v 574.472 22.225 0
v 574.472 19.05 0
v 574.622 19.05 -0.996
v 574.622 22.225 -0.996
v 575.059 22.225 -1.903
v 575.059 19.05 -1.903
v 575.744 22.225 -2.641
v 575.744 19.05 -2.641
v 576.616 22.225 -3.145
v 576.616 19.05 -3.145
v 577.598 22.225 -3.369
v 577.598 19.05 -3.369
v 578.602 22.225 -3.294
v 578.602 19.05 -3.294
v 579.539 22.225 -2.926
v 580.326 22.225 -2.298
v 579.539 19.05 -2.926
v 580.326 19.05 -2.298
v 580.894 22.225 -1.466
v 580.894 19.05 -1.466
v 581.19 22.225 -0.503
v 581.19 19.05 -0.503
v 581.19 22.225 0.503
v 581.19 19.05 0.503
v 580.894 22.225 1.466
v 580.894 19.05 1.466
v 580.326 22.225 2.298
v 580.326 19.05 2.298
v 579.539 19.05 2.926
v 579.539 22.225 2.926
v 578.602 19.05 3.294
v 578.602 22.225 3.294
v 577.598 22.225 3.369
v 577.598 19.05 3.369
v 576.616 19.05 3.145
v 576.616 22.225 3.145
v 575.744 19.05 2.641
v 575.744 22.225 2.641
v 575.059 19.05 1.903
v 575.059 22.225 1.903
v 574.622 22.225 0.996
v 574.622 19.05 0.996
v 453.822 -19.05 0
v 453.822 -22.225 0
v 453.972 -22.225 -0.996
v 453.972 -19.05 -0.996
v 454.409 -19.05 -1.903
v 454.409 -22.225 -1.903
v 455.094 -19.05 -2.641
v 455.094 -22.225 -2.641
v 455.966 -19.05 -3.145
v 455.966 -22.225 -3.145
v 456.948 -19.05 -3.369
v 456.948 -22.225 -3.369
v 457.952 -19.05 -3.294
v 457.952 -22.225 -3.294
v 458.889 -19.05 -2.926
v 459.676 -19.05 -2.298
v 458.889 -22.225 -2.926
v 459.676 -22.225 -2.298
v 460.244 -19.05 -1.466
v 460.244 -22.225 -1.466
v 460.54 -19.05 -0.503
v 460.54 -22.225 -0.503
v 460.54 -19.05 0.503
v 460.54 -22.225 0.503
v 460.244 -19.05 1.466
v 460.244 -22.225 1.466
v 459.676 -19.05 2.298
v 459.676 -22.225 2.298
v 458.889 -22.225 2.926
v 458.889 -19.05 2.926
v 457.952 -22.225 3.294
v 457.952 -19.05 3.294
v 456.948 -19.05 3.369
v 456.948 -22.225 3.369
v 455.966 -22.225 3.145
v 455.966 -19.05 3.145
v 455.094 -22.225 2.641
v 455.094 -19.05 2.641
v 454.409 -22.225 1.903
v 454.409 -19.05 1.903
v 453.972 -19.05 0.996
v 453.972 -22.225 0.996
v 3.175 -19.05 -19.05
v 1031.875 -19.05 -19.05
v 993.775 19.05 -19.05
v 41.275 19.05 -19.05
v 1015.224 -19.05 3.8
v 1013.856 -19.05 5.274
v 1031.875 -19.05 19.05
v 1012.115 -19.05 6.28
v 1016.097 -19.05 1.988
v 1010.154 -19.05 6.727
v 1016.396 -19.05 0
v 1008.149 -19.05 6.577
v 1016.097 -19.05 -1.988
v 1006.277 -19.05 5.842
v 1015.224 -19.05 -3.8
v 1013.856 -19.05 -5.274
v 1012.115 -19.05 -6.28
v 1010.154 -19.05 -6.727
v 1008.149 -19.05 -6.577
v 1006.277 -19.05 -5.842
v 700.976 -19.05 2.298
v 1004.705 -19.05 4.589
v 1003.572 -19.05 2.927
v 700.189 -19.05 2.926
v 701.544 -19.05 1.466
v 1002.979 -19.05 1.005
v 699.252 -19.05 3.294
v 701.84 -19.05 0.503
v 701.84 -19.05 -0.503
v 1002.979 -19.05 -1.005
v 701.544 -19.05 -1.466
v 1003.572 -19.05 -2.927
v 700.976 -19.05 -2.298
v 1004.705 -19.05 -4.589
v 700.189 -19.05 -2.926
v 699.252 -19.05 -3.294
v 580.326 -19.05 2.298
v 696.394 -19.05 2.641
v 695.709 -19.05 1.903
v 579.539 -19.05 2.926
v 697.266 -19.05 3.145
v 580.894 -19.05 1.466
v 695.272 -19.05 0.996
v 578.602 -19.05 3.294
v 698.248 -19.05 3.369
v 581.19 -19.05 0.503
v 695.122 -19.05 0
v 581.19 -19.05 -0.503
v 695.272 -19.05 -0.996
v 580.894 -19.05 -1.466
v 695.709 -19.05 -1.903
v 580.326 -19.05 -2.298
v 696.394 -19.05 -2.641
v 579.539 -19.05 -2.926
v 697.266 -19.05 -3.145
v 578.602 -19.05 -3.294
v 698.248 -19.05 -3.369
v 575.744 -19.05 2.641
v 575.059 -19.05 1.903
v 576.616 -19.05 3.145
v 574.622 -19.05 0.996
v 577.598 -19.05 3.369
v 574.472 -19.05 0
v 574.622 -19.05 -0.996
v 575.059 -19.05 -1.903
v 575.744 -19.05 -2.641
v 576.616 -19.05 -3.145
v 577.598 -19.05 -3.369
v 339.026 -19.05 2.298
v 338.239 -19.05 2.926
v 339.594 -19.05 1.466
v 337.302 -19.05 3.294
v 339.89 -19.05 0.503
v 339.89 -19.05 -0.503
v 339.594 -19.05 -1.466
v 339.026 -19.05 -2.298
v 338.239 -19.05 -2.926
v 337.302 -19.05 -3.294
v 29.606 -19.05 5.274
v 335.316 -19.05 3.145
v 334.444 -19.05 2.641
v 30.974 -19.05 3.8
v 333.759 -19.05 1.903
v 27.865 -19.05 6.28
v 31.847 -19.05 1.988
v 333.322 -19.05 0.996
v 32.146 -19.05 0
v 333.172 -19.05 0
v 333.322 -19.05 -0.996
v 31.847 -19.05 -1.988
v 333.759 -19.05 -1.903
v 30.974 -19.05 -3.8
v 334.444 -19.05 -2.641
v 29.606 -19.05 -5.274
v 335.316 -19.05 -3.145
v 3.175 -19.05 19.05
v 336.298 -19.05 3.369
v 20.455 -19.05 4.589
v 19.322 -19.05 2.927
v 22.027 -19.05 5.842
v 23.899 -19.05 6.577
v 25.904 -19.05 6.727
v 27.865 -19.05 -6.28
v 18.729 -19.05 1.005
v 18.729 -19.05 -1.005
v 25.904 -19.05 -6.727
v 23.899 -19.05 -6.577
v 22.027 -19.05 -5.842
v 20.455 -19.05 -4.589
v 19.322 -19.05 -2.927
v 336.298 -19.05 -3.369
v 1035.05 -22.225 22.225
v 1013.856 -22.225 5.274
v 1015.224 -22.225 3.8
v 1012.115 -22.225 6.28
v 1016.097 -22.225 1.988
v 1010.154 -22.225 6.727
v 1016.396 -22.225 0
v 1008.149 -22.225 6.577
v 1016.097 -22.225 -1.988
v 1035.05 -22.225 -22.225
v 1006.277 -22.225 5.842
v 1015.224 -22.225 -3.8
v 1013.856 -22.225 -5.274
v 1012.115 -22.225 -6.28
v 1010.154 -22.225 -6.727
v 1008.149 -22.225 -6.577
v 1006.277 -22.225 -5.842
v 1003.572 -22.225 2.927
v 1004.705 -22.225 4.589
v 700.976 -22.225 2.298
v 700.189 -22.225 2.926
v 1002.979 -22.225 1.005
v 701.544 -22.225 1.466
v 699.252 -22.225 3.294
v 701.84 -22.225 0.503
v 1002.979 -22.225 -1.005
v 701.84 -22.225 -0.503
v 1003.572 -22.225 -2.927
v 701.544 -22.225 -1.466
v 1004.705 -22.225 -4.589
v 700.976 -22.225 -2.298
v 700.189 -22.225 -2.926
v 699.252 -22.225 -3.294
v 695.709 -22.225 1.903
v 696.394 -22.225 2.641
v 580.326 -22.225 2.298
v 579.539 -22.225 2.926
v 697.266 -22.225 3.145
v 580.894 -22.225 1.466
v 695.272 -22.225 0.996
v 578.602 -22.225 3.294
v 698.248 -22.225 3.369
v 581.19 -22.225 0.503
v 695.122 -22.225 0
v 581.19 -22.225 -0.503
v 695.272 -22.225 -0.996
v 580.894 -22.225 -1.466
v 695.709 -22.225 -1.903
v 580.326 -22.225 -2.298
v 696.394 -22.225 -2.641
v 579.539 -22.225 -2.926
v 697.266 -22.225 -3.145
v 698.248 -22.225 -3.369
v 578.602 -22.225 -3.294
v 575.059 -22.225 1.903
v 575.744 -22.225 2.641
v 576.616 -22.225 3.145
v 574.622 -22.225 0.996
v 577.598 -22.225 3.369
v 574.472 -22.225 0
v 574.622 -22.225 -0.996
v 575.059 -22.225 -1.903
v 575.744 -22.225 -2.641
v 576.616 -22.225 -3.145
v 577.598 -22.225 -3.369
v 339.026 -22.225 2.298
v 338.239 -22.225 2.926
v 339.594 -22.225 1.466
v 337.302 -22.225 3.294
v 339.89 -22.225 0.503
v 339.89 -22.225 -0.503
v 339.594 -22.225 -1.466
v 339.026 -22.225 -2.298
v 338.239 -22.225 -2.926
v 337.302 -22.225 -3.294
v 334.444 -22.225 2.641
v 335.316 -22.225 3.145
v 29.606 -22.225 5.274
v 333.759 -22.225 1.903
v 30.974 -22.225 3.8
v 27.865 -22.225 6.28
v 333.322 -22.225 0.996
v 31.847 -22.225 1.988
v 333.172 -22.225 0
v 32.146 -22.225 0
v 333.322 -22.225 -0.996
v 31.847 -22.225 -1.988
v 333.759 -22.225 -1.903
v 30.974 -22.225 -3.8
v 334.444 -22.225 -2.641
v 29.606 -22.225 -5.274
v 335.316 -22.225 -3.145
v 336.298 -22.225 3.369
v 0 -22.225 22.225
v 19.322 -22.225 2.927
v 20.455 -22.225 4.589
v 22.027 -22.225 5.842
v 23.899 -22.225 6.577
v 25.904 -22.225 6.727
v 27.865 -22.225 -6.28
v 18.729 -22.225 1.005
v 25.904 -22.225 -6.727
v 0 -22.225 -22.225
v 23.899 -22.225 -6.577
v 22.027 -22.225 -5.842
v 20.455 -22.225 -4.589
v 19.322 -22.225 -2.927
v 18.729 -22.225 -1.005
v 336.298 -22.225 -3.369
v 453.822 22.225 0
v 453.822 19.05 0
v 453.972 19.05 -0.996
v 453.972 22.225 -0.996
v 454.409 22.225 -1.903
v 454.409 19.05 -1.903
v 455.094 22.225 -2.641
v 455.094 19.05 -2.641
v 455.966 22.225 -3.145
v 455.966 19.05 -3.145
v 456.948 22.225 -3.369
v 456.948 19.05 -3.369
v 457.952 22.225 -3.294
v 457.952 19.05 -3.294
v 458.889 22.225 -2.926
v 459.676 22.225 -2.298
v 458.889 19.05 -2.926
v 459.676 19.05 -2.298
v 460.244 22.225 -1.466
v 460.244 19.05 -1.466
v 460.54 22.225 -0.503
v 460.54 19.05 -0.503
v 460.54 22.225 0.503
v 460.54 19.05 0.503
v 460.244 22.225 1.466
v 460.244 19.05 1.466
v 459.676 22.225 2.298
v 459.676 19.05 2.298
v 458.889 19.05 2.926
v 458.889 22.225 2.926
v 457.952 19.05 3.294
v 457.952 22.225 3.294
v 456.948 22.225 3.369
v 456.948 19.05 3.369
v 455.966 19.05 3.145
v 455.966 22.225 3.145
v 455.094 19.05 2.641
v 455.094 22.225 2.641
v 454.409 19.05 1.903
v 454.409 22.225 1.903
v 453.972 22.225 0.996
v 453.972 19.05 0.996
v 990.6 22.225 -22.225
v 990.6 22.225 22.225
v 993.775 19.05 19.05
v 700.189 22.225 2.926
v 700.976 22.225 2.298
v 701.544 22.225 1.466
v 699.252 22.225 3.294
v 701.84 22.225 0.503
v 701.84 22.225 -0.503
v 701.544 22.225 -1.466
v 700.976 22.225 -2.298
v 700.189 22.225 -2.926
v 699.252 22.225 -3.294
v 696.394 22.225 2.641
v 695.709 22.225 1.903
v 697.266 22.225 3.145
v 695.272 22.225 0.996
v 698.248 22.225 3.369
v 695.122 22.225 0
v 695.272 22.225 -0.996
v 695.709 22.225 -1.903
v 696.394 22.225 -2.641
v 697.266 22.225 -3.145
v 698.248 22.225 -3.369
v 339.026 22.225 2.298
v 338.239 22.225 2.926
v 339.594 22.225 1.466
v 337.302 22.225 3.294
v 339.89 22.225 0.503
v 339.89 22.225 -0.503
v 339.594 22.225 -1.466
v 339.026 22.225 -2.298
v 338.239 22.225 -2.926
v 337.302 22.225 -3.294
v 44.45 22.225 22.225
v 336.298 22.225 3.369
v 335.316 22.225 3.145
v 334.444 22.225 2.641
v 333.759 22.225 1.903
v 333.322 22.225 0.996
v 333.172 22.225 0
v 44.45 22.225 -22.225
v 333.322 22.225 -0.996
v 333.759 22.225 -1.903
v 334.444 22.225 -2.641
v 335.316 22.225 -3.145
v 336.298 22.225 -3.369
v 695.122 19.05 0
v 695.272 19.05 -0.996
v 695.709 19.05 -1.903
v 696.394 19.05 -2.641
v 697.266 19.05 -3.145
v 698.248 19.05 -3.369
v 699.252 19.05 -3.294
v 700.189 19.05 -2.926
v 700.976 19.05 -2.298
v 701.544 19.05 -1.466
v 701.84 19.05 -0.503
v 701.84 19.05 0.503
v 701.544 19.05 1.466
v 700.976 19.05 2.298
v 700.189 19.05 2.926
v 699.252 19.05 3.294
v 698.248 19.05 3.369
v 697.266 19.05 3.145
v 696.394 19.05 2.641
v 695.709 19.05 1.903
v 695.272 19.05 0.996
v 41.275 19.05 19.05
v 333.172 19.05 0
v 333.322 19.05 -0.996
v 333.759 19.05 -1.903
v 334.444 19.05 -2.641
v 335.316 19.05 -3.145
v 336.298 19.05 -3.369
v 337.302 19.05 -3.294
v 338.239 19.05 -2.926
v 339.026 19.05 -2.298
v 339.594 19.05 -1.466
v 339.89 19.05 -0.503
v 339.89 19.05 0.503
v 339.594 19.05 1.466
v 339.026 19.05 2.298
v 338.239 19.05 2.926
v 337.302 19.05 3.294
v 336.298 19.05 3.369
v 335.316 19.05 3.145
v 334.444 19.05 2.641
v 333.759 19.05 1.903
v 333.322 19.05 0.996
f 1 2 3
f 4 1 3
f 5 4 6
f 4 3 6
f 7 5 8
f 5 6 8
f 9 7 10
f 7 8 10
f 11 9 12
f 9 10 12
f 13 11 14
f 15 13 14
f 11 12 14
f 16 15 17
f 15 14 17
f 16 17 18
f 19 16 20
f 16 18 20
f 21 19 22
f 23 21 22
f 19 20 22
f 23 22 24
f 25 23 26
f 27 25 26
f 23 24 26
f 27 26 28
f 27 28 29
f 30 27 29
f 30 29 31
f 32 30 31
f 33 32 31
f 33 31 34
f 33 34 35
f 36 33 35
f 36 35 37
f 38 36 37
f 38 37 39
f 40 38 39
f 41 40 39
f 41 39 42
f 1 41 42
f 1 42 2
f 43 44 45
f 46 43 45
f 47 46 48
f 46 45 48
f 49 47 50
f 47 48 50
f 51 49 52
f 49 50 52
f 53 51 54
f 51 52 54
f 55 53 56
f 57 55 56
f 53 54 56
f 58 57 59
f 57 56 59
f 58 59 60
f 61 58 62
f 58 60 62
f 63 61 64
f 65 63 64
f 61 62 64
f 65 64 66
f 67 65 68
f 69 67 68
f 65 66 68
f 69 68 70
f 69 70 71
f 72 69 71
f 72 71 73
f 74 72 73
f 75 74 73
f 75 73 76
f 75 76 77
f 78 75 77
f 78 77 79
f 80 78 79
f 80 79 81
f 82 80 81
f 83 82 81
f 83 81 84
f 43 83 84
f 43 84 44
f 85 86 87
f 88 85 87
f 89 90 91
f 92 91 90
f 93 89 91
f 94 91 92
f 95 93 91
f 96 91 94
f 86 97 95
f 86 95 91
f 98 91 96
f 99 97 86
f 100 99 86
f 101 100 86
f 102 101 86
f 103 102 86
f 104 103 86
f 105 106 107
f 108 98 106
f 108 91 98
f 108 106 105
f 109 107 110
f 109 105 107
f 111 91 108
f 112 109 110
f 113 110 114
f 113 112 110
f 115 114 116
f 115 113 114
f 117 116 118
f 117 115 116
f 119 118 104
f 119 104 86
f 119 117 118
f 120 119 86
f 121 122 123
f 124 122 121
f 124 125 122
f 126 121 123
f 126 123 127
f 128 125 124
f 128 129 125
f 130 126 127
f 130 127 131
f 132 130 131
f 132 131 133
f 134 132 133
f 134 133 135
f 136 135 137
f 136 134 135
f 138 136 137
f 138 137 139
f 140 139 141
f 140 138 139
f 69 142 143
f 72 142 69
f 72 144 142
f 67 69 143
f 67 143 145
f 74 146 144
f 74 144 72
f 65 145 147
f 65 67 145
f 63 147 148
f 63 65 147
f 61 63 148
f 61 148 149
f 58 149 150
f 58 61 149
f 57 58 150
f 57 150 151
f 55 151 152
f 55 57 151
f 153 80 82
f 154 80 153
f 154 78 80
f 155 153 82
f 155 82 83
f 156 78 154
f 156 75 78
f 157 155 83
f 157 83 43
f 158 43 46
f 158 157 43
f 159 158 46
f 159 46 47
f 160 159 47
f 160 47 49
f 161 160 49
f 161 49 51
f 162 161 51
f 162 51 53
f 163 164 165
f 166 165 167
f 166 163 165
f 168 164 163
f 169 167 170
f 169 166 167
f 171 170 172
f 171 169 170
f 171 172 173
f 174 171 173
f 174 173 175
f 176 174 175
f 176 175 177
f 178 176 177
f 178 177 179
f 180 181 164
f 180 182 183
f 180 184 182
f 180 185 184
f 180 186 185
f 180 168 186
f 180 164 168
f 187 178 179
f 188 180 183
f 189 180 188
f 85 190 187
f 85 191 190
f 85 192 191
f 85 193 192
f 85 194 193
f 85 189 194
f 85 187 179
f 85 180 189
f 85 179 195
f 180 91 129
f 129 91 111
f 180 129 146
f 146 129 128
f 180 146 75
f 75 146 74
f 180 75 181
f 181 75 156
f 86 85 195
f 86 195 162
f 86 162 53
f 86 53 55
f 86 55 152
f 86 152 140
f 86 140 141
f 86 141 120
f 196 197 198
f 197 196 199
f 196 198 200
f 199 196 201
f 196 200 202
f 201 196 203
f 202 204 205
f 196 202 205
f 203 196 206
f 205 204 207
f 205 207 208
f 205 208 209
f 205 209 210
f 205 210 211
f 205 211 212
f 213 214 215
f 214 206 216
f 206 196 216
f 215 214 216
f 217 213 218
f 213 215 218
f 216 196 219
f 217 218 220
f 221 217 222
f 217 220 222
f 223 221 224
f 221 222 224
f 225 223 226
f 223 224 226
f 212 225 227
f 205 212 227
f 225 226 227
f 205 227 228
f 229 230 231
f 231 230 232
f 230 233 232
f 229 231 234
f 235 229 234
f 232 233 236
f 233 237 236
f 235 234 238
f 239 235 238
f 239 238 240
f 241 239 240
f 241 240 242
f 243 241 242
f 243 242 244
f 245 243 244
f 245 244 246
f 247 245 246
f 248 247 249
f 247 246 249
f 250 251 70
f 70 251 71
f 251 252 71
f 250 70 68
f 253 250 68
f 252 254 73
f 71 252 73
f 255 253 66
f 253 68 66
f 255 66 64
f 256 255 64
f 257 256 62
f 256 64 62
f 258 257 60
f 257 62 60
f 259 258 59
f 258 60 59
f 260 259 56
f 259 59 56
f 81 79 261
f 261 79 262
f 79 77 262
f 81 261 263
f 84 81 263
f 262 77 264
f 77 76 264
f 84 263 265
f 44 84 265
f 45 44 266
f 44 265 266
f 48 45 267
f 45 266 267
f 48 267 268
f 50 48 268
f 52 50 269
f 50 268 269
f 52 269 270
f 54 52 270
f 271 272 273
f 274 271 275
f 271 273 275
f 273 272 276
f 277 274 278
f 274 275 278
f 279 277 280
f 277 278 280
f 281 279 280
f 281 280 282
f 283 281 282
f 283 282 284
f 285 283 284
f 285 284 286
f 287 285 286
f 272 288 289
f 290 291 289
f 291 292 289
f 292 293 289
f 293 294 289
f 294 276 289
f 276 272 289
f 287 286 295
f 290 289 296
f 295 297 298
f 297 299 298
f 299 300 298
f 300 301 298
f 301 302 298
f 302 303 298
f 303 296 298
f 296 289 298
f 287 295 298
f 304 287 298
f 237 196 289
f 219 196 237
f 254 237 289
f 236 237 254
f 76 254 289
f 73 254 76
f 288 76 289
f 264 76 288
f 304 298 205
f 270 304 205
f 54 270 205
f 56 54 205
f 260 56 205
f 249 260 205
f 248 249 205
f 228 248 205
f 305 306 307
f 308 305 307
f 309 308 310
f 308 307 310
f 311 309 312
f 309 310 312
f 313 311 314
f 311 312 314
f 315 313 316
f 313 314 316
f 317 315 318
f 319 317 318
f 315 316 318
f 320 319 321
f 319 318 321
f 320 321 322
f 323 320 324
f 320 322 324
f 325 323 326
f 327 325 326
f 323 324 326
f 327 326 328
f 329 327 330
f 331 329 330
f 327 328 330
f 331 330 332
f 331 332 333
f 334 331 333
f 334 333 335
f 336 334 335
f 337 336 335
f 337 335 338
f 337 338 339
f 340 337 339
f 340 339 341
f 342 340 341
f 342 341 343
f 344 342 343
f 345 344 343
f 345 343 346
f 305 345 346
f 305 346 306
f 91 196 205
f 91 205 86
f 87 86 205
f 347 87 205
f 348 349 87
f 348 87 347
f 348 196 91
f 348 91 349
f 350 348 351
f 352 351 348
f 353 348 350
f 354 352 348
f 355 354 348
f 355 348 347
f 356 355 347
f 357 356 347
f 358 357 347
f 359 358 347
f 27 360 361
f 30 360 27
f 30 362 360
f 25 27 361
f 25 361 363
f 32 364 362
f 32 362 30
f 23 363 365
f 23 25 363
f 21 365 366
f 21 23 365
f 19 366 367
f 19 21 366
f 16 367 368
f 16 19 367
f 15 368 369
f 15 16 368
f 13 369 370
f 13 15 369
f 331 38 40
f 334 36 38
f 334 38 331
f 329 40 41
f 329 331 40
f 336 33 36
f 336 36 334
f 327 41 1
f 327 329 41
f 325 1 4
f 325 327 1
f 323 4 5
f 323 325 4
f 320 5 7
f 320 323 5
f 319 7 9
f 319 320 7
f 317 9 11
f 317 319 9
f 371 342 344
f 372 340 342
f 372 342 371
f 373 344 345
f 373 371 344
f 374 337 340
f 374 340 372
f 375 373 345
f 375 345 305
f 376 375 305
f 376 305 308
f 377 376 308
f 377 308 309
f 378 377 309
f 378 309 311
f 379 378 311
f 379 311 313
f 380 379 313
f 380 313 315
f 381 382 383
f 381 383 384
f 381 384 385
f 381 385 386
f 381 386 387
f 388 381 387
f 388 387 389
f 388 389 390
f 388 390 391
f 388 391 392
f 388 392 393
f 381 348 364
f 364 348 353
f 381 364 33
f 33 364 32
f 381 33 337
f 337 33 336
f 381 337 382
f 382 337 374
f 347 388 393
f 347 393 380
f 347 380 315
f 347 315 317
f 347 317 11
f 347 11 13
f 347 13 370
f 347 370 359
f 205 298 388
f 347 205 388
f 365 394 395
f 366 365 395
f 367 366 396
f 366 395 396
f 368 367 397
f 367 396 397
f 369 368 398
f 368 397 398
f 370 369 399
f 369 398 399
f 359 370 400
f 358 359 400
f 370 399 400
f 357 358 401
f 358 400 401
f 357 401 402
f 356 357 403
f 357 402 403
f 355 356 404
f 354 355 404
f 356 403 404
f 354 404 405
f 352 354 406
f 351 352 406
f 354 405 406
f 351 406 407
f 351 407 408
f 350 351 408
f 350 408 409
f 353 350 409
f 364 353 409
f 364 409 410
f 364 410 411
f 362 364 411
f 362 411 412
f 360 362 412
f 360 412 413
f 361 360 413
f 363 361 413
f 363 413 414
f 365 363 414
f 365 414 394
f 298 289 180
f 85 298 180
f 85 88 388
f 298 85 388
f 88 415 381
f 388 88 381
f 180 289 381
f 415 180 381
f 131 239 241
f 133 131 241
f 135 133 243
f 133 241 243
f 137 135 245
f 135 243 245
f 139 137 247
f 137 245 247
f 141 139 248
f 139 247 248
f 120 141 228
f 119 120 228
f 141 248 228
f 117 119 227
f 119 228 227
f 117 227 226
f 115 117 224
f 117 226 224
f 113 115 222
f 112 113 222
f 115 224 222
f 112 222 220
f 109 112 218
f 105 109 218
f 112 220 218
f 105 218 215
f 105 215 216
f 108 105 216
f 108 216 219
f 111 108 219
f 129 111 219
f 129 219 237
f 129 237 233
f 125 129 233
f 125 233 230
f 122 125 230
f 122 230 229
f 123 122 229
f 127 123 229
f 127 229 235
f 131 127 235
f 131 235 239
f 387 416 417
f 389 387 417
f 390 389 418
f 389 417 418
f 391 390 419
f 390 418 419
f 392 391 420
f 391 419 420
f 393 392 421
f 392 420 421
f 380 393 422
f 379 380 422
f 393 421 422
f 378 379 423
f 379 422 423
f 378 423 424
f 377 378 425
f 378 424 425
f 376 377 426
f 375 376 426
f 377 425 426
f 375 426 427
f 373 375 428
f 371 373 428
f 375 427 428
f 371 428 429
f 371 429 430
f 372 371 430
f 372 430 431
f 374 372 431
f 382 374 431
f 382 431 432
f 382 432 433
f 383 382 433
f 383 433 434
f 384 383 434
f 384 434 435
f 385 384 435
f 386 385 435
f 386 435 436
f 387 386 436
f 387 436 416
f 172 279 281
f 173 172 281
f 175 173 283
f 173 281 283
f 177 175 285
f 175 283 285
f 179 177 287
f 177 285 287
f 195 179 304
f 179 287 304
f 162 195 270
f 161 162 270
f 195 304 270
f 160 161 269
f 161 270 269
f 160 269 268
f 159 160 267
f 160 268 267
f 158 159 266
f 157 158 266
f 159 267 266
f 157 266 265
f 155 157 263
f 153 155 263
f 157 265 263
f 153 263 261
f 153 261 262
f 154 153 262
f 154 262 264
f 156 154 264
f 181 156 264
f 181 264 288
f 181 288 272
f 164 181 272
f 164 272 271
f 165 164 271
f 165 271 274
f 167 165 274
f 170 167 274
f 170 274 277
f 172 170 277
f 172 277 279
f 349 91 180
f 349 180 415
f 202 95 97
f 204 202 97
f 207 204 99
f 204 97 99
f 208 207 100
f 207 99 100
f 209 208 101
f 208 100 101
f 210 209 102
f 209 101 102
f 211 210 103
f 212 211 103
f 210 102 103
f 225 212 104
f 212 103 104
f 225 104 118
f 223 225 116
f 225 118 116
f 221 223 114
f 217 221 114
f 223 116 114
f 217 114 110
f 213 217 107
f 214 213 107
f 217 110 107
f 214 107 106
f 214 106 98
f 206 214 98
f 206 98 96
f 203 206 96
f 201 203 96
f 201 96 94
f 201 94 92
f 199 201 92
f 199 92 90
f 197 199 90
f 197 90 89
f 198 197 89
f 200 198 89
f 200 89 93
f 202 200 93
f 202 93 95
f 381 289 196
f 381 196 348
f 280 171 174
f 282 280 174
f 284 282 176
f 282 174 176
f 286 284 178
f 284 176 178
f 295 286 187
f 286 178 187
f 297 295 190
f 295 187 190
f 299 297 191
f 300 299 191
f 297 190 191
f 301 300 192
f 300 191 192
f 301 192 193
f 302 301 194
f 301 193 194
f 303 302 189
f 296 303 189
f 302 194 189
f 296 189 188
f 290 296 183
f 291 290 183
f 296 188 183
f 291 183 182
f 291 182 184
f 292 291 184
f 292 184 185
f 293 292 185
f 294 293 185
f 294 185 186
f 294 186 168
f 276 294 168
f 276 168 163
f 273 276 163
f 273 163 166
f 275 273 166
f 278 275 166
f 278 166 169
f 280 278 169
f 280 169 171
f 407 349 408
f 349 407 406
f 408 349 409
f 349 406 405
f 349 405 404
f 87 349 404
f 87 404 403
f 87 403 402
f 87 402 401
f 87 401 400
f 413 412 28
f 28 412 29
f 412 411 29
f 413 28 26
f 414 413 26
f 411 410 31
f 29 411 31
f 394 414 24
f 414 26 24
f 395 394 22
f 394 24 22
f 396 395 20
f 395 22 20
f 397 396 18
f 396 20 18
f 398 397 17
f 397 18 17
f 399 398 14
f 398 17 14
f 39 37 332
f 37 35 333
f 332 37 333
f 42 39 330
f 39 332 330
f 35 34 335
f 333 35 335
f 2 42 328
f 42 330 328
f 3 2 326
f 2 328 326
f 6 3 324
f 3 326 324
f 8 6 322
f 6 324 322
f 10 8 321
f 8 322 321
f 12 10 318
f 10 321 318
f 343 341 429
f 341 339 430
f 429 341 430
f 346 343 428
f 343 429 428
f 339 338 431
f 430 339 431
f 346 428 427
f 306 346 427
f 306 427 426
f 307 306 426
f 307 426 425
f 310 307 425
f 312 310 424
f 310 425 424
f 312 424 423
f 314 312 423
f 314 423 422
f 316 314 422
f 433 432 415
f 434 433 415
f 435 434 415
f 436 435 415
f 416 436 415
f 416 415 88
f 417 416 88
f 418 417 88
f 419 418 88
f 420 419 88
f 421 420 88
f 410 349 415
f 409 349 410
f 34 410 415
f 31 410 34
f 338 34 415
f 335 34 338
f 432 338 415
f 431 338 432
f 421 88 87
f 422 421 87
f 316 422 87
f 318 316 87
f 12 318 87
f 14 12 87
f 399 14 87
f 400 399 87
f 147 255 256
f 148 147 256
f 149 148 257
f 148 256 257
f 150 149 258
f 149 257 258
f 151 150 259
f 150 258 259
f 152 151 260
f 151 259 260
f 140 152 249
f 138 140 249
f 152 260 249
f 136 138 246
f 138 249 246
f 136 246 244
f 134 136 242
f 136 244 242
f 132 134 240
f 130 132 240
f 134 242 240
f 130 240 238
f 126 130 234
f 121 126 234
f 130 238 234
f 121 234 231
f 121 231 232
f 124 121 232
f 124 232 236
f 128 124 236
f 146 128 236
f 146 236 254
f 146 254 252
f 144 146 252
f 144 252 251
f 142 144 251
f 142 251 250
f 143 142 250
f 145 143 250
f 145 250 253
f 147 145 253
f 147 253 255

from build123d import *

# Parameters (mm, degrees)
SKETCH1_W               = 44.45
SKETCH1_H               = 44.45
SKETCH1_W_2             = 38.1
SKETCH1_H_2             = 38.1
BOSS_EXTRUDE1_DEPTH     = 1035.05
CUT_EXTRUDE1_DEPTH      = 1037.242373012
F_1_2_CLEARANCE_HOLE1_D = 13.49248
F_1_4_CLEARANCE_HOLE1_D = 6.7564


with BuildPart() as part:
    # Sketch1 → Boss-Extrude1 (new body)
    with BuildSketch(Plane(origin=(0, 0, 0), x_dir=(0, 0, -1), z_dir=(1, 0, 0))):
        Rectangle(SKETCH1_W, SKETCH1_H)
        Rectangle(SKETCH1_W_2, SKETCH1_H_2, mode=Mode.SUBTRACT)
    extrude(amount=BOSS_EXTRUDE1_DEPTH)

    # Sketch2 → Cut-Extrude1 (cut, through all)
    with BuildSketch(Plane.XY.offset(22.225)):
        Polygon((0, 22.225), (0, -22.225), (44.45, 22.225), align=None)
        Polygon((990.6, 22.225), (1035.05, 22.225), (1035.05, -22.225), align=None)
    extrude(amount=-CUT_EXTRUDE1_DEPTH, mode=Mode.SUBTRACT)

    # 1/2 Clearance Hole1 (through all)
    with Locations(Plane(origin=(0, -22.225, 0), x_dir=(-1, 0, 0), z_dir=(0, -1, 0))):
        with Locations((-25.4, 0), (-1009.65, 0)):
            Hole(F_1_2_CLEARANCE_HOLE1_D / 2)

    # 1/4 Clearance Hole1 (through all)
    with Locations(Plane(origin=(0, 22.225, 0), x_dir=(1, 0, 0), z_dir=(0, 1, 0))):
        with Locations((336.55, 0), (457.2, 0), (577.85, 0), (698.5, 0)):
            Hole(F_1_4_CLEARANCE_HOLE1_D / 2)


solid = part.part
